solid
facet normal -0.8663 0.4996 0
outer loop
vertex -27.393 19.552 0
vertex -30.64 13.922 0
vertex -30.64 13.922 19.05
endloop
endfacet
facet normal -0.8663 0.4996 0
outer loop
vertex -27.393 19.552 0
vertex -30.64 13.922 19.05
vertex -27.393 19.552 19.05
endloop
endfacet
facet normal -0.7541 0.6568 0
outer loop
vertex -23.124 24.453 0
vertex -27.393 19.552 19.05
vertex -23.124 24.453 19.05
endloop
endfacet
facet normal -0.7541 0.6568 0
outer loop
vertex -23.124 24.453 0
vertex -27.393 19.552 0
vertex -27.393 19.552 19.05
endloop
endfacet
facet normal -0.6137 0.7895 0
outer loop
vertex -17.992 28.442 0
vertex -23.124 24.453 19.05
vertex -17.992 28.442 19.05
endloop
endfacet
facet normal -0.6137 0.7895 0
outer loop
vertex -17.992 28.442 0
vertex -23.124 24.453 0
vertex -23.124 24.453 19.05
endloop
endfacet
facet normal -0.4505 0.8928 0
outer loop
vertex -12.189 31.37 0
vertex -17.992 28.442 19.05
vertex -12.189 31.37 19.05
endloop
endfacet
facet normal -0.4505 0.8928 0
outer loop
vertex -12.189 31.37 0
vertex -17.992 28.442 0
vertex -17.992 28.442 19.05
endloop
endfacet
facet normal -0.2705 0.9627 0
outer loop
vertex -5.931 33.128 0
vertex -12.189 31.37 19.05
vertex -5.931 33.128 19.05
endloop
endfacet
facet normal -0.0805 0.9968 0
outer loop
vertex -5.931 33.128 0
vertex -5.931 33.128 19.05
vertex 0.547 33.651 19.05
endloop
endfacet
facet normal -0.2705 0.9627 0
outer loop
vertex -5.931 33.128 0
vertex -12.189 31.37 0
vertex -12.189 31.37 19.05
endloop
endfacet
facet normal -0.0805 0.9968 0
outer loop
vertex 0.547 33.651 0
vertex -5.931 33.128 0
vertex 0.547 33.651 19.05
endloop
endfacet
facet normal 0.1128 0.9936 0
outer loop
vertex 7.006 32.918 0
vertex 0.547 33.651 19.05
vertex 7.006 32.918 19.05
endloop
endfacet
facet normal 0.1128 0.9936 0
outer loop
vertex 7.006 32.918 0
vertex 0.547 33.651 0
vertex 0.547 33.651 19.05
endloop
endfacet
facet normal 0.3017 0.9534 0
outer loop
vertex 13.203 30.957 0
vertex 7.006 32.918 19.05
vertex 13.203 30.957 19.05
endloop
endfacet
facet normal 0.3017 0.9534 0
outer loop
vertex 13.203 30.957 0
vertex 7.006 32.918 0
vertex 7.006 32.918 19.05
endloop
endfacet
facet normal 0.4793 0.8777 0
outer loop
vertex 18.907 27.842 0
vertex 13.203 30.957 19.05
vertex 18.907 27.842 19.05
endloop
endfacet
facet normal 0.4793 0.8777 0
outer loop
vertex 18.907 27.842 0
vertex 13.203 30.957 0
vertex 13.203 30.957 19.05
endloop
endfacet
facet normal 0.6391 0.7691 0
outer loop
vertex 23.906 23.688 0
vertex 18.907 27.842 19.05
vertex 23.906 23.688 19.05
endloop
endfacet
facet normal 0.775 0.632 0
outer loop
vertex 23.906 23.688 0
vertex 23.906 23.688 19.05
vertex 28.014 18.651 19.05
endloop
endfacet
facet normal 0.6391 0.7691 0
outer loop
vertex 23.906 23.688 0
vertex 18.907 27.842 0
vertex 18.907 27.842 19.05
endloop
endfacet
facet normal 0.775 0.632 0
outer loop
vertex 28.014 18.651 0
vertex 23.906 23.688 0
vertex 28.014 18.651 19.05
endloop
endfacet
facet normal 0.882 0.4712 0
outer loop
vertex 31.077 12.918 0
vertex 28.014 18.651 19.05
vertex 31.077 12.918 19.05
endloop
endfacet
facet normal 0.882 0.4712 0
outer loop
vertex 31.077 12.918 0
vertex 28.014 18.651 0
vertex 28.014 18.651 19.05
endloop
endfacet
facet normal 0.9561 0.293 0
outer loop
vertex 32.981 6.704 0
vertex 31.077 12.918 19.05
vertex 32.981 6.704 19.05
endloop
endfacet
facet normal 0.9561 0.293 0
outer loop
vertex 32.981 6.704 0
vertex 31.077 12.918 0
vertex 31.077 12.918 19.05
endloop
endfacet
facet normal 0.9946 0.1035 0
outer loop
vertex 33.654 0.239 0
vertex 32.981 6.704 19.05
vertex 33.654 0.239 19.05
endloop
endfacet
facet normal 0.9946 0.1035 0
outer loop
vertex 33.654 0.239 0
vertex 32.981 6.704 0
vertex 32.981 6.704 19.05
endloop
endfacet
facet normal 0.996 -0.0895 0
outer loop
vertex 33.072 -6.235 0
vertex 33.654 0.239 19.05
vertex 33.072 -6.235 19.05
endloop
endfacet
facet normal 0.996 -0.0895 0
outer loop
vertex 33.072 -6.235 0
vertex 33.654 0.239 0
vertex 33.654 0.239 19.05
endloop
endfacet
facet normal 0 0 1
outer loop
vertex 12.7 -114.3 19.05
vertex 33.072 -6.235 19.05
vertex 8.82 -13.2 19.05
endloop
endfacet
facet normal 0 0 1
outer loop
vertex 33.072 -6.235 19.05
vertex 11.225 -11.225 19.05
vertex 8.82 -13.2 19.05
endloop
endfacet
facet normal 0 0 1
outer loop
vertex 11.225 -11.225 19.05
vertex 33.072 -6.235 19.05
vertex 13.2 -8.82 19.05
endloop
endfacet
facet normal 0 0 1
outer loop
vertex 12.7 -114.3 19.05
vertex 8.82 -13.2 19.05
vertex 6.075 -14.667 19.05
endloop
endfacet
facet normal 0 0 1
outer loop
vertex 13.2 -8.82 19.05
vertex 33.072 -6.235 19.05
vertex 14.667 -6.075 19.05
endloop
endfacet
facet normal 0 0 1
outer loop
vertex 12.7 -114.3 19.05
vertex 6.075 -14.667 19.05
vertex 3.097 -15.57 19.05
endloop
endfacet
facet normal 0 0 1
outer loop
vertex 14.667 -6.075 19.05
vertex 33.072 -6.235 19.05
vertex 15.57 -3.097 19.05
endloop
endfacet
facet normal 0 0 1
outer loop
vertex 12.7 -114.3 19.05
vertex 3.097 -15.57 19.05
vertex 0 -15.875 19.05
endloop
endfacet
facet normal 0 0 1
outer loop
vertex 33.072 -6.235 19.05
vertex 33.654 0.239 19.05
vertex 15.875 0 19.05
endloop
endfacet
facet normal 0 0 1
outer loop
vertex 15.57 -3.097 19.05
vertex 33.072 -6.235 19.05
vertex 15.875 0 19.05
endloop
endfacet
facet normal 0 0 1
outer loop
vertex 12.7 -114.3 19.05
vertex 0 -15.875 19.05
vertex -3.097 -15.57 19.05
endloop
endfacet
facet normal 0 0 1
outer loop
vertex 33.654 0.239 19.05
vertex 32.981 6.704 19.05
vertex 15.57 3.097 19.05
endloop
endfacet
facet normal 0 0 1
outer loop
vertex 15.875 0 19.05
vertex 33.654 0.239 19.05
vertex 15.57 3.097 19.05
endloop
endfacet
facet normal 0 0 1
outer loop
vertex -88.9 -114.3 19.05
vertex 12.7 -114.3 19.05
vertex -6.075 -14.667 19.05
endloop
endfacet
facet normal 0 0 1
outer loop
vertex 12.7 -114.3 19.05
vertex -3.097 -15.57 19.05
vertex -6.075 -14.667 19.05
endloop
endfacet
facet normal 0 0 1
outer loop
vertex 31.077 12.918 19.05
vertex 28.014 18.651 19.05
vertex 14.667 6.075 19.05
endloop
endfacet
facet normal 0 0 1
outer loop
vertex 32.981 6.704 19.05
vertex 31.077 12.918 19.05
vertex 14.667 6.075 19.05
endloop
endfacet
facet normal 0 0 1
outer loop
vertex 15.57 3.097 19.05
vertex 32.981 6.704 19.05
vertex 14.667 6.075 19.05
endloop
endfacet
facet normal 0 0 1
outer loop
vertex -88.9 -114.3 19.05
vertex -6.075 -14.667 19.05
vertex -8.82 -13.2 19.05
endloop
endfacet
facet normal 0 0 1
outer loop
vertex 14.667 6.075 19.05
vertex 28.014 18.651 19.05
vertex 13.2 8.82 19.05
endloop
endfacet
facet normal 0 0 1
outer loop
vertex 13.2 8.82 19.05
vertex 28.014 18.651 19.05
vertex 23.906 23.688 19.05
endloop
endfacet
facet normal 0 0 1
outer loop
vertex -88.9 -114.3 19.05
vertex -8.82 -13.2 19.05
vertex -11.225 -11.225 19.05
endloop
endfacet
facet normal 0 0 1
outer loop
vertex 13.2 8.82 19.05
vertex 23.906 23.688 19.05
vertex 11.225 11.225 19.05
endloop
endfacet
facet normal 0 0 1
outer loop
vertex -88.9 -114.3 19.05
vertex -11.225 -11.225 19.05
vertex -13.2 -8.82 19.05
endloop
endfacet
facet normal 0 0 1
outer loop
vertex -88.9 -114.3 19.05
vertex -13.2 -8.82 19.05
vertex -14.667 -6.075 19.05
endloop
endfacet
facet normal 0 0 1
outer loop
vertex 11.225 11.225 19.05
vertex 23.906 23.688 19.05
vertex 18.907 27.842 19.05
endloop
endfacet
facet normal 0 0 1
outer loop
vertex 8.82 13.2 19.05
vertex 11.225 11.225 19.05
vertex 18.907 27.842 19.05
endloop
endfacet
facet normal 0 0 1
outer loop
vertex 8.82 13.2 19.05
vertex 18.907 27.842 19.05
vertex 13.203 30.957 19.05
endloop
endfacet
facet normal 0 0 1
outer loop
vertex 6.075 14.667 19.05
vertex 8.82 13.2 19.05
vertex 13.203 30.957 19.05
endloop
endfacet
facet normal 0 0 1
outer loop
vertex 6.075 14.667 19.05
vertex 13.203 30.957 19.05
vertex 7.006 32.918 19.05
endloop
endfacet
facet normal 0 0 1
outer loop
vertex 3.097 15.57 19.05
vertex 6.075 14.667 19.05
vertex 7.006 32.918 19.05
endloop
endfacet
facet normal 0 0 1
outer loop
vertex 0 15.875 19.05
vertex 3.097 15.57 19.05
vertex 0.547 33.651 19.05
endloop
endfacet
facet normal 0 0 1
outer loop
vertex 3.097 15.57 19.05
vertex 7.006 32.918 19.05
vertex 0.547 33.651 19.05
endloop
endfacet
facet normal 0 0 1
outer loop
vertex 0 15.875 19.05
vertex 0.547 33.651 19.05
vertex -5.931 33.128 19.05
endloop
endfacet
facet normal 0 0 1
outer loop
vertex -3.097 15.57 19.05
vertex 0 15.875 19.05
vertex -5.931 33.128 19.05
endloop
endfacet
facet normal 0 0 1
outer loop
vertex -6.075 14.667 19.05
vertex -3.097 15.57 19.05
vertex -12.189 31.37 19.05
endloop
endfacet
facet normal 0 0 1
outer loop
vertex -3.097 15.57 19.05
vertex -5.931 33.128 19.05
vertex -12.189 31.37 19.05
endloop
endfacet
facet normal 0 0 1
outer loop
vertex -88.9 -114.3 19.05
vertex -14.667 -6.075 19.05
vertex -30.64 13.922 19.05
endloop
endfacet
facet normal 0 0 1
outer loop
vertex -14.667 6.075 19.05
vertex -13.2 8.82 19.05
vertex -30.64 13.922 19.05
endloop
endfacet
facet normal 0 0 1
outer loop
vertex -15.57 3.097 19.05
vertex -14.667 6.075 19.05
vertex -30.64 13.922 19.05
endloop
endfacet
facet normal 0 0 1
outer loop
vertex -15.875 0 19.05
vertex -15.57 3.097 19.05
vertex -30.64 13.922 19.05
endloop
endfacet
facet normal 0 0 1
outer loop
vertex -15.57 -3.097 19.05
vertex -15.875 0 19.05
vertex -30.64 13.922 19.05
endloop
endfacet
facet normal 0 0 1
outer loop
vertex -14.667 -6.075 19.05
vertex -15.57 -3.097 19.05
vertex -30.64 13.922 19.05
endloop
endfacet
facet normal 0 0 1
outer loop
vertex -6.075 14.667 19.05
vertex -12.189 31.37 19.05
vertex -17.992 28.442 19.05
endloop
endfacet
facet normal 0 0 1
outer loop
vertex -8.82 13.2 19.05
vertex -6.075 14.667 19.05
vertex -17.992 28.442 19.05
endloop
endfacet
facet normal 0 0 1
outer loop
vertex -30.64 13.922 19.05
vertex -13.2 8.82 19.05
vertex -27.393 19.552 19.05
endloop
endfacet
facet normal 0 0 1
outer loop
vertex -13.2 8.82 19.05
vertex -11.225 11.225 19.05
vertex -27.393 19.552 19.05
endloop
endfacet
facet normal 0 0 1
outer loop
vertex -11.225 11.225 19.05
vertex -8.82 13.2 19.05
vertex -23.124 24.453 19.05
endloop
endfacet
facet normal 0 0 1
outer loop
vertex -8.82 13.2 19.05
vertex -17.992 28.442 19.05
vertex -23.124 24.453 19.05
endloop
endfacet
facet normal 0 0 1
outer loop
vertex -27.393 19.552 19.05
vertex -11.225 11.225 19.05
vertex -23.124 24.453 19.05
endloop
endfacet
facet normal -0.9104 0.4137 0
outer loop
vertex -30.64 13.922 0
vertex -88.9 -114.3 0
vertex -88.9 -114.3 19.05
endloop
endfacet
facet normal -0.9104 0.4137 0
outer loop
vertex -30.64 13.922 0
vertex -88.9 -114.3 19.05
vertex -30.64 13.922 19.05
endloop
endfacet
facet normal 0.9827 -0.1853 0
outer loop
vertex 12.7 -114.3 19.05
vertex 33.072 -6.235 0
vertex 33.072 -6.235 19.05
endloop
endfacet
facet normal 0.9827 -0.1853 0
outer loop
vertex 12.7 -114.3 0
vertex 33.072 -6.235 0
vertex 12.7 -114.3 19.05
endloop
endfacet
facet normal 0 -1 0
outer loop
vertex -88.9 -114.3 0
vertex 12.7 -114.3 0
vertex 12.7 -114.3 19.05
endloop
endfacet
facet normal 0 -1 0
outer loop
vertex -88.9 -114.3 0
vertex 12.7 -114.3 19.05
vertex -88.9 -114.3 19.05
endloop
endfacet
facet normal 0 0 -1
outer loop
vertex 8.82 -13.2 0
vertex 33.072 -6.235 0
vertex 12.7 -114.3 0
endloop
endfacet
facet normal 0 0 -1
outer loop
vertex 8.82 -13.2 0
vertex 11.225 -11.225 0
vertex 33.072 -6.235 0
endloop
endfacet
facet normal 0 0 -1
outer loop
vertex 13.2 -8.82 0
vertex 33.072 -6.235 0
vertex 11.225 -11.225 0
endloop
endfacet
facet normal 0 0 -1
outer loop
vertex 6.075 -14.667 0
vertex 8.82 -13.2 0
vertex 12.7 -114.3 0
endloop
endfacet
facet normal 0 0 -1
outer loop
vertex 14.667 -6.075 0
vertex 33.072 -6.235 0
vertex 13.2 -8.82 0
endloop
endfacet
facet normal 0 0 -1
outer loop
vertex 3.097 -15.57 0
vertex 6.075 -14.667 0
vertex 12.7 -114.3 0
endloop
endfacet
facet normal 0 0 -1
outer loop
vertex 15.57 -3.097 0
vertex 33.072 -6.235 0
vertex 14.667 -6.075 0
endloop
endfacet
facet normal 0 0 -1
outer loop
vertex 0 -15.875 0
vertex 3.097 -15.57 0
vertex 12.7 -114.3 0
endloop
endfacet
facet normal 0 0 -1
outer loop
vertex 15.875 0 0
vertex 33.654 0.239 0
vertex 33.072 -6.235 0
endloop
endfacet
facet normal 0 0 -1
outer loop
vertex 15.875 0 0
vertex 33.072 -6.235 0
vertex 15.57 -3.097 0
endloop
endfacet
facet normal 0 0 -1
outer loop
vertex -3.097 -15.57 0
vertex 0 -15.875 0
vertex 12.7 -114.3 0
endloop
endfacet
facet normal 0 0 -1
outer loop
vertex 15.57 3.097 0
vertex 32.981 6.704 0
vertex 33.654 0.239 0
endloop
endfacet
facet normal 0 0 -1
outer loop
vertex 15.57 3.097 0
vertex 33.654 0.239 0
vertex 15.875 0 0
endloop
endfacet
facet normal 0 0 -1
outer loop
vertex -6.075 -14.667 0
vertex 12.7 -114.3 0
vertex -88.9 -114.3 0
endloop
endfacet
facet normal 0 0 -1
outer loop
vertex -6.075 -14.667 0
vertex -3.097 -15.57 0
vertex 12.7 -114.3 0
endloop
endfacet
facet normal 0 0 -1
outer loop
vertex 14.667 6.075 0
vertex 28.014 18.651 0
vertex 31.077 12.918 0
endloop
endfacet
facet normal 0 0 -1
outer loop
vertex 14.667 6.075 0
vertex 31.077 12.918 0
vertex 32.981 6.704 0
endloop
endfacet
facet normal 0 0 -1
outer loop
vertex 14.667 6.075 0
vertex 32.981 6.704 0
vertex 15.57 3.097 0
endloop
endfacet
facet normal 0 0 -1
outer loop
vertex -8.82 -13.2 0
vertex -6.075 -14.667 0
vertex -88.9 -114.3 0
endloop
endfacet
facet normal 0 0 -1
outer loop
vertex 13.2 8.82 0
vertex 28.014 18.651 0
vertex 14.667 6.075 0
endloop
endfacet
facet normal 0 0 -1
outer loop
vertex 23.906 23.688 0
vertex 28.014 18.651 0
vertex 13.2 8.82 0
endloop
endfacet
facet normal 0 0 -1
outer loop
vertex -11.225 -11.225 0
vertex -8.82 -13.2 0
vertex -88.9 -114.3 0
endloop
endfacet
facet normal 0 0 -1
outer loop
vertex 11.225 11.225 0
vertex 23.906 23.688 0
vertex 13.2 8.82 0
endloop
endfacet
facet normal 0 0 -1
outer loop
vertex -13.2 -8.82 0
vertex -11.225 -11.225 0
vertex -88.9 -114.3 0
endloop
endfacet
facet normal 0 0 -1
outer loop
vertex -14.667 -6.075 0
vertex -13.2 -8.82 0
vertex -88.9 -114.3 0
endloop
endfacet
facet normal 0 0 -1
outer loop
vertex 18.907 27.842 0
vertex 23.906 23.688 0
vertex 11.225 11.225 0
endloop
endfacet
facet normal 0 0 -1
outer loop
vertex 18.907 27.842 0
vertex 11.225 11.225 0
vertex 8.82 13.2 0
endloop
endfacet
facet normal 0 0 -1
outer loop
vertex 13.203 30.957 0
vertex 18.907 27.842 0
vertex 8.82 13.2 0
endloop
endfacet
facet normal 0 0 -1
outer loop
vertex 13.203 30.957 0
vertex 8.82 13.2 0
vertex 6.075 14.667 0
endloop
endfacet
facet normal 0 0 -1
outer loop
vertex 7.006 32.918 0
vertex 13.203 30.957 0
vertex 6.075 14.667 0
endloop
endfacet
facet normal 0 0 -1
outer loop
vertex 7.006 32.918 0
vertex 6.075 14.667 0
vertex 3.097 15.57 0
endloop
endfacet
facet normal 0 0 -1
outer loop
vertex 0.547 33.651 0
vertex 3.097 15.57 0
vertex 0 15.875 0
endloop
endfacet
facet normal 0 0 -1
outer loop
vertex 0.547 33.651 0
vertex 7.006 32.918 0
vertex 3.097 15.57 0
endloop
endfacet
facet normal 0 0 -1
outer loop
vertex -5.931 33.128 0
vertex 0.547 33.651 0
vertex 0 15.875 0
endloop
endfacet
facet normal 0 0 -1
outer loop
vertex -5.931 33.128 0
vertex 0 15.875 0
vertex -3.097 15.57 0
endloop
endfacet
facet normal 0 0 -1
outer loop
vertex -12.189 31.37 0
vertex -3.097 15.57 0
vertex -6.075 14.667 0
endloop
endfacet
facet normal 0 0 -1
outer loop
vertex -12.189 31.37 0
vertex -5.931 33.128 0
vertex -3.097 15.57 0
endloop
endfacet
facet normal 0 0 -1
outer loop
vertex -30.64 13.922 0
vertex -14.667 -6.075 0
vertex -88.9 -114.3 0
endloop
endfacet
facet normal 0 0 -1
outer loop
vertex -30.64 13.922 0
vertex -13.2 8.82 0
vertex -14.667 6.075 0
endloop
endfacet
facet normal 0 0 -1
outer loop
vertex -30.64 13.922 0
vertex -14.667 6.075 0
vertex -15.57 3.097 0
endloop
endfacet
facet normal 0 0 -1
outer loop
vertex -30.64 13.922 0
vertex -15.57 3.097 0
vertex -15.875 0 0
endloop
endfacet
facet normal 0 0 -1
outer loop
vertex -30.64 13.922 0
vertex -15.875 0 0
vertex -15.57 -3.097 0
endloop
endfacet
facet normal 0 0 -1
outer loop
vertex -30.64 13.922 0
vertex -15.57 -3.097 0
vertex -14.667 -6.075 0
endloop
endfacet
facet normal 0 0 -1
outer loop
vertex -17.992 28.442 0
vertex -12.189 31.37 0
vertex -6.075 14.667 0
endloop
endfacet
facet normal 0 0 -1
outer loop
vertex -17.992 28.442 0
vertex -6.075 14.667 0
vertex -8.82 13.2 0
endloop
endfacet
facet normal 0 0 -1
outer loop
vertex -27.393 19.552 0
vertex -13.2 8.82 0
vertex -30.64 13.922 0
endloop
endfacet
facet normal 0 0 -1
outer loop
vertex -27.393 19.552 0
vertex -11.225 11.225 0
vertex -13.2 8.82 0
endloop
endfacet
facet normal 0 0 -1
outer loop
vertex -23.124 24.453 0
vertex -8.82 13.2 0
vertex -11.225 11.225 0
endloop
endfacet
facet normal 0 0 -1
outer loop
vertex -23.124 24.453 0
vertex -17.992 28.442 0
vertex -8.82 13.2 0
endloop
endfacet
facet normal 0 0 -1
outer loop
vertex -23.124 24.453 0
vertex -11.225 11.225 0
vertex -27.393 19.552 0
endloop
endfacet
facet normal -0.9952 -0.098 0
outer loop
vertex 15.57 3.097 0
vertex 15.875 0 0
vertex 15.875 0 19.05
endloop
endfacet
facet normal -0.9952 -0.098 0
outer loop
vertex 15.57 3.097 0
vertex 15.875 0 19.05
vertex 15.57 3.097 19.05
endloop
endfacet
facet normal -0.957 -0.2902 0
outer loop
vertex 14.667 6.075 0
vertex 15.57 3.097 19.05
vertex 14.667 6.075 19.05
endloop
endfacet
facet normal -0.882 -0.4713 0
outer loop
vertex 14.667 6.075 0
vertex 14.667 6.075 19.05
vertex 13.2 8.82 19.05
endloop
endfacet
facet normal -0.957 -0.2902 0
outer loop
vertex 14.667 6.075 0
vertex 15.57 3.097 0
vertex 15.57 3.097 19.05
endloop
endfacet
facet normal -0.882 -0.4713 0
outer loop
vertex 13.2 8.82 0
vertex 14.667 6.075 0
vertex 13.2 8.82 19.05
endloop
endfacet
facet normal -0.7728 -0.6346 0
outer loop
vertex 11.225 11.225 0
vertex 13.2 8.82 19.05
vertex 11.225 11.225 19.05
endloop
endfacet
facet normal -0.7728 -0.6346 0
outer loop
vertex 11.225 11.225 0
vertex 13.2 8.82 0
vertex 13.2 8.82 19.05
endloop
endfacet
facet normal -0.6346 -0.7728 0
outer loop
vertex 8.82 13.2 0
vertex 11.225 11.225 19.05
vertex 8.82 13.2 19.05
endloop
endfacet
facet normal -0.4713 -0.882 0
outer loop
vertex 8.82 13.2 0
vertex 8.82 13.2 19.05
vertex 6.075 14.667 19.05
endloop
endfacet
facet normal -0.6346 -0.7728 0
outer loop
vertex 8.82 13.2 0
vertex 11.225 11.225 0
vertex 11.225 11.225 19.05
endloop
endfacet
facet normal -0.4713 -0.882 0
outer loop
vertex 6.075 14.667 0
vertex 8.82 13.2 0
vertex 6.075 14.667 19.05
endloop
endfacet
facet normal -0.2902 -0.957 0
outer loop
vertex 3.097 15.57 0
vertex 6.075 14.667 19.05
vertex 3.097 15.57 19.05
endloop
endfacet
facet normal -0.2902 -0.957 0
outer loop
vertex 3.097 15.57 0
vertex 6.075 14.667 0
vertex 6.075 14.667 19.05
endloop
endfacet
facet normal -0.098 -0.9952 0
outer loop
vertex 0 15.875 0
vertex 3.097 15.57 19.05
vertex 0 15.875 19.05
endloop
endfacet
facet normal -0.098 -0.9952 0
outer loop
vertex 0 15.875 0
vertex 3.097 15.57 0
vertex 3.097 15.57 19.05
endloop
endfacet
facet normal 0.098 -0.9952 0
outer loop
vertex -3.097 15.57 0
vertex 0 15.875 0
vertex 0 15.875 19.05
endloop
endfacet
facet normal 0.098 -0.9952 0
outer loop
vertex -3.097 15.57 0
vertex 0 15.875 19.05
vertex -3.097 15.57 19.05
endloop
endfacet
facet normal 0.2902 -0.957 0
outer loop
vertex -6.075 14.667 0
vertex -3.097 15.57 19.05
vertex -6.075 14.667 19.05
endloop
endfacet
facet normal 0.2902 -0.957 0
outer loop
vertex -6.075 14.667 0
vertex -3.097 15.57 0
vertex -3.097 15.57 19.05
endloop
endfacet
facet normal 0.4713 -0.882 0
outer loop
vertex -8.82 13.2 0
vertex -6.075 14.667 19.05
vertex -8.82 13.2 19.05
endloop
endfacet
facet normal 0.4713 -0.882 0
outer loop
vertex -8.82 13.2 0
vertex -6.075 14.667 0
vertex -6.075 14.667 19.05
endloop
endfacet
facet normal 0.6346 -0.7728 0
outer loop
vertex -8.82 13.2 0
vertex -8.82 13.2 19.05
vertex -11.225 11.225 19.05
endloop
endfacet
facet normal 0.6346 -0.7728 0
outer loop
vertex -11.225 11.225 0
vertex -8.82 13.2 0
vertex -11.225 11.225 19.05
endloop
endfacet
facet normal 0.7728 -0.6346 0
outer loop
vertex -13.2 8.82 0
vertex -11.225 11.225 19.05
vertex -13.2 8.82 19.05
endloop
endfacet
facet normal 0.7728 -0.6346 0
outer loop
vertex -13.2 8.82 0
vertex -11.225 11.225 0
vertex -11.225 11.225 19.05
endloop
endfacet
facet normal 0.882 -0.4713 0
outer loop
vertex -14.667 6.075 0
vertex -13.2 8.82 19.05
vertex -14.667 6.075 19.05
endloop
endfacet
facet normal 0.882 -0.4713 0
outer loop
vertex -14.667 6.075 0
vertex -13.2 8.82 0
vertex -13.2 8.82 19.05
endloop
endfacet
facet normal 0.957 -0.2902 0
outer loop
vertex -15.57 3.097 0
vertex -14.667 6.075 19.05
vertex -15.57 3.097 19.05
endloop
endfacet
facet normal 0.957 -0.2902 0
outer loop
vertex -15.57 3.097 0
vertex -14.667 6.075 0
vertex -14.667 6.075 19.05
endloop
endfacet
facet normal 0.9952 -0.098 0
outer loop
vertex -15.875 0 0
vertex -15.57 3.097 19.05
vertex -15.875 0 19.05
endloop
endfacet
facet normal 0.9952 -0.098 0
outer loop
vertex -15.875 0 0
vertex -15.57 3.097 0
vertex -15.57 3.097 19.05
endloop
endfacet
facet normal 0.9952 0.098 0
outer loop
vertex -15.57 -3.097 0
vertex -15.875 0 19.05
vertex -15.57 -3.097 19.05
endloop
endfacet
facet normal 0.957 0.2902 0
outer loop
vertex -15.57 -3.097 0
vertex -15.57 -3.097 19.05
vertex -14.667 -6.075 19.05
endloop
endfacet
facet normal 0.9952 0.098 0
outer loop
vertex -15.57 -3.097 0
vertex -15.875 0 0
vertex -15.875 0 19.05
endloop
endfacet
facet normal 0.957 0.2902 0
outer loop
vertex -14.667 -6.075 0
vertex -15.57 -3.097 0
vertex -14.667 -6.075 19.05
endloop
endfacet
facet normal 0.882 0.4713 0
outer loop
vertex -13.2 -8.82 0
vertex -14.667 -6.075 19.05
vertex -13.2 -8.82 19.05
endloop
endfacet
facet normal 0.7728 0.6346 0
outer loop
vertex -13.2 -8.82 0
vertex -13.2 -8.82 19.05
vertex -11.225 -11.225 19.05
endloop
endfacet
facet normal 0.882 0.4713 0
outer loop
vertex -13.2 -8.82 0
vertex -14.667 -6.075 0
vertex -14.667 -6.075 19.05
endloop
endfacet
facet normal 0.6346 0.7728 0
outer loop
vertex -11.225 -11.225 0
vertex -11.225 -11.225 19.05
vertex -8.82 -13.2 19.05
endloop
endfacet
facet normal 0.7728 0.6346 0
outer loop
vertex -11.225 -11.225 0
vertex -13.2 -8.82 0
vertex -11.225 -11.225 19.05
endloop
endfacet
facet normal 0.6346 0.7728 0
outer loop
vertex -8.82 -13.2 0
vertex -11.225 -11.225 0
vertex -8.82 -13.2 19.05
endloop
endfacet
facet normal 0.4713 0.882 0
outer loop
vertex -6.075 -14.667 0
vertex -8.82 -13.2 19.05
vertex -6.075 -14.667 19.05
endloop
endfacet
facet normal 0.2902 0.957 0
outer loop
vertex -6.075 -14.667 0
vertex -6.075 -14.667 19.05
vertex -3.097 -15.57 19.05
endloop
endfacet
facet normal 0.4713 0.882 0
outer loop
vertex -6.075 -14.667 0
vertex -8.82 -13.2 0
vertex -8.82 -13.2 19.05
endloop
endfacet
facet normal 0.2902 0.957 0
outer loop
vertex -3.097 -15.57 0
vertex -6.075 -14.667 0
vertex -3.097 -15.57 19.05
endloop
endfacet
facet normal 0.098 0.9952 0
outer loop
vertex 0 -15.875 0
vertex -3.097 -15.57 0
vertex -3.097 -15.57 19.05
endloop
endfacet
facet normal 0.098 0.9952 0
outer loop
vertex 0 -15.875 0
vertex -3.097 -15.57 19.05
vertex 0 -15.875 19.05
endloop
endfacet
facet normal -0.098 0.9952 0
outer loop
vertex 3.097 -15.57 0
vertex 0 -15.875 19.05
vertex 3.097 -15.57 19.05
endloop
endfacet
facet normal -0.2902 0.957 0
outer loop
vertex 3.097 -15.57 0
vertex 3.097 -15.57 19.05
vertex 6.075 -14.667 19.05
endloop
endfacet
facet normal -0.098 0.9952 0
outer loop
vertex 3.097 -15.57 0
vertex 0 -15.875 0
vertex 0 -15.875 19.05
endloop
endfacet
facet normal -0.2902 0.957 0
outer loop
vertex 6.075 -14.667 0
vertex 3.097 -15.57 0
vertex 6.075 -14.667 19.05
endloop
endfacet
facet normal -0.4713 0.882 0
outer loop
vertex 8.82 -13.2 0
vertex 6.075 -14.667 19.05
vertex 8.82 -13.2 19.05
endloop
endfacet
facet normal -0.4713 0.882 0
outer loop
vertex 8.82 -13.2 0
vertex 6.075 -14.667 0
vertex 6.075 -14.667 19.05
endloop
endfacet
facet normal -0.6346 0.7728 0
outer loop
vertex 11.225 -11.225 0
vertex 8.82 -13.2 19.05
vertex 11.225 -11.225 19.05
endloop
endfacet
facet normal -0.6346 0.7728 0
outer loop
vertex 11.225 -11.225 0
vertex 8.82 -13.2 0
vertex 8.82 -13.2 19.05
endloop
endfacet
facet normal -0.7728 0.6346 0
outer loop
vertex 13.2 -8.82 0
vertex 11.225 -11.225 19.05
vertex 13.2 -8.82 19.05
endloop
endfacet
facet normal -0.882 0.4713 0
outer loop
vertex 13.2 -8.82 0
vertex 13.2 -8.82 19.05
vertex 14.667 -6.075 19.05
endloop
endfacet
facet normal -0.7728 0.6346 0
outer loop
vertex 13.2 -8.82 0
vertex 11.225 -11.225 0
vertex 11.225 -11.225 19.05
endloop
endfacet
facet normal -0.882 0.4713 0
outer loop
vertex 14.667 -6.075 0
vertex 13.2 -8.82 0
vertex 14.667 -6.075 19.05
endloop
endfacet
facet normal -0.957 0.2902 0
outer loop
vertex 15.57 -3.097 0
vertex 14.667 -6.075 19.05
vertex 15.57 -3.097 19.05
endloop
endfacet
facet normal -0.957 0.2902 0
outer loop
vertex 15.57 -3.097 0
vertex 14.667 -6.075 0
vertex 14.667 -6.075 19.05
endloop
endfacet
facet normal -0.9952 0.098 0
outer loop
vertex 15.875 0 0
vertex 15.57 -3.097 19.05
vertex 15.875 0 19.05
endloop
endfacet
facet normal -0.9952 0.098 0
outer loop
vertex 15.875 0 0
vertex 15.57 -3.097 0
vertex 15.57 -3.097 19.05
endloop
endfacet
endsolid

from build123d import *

# Parameters (mm, degrees)
SKETCH1_R           = 15.875
BOSS_EXTRUDE1_DEPTH = 19.05


with BuildPart() as part:
    # Sketch1 → Boss-Extrude1 (new body)
    with BuildSketch(Plane.XY):
        with BuildLine():
            Line((33.072437746, -6.234812473), (12.7, -114.3))
            Line((12.7, -114.3), (-88.9, -114.3))
            Line((-88.9, -114.3), (-30.640469546, 13.921948535))
            ThreePointArc((-30.640469546, 13.921948535), (10.151471367, 32.087484384), (33.072437746, -6.234812473))
        make_face()
        Circle(SKETCH1_R, mode=Mode.SUBTRACT)
    extrude(amount=BOSS_EXTRUDE1_DEPTH)


solid = part.part
